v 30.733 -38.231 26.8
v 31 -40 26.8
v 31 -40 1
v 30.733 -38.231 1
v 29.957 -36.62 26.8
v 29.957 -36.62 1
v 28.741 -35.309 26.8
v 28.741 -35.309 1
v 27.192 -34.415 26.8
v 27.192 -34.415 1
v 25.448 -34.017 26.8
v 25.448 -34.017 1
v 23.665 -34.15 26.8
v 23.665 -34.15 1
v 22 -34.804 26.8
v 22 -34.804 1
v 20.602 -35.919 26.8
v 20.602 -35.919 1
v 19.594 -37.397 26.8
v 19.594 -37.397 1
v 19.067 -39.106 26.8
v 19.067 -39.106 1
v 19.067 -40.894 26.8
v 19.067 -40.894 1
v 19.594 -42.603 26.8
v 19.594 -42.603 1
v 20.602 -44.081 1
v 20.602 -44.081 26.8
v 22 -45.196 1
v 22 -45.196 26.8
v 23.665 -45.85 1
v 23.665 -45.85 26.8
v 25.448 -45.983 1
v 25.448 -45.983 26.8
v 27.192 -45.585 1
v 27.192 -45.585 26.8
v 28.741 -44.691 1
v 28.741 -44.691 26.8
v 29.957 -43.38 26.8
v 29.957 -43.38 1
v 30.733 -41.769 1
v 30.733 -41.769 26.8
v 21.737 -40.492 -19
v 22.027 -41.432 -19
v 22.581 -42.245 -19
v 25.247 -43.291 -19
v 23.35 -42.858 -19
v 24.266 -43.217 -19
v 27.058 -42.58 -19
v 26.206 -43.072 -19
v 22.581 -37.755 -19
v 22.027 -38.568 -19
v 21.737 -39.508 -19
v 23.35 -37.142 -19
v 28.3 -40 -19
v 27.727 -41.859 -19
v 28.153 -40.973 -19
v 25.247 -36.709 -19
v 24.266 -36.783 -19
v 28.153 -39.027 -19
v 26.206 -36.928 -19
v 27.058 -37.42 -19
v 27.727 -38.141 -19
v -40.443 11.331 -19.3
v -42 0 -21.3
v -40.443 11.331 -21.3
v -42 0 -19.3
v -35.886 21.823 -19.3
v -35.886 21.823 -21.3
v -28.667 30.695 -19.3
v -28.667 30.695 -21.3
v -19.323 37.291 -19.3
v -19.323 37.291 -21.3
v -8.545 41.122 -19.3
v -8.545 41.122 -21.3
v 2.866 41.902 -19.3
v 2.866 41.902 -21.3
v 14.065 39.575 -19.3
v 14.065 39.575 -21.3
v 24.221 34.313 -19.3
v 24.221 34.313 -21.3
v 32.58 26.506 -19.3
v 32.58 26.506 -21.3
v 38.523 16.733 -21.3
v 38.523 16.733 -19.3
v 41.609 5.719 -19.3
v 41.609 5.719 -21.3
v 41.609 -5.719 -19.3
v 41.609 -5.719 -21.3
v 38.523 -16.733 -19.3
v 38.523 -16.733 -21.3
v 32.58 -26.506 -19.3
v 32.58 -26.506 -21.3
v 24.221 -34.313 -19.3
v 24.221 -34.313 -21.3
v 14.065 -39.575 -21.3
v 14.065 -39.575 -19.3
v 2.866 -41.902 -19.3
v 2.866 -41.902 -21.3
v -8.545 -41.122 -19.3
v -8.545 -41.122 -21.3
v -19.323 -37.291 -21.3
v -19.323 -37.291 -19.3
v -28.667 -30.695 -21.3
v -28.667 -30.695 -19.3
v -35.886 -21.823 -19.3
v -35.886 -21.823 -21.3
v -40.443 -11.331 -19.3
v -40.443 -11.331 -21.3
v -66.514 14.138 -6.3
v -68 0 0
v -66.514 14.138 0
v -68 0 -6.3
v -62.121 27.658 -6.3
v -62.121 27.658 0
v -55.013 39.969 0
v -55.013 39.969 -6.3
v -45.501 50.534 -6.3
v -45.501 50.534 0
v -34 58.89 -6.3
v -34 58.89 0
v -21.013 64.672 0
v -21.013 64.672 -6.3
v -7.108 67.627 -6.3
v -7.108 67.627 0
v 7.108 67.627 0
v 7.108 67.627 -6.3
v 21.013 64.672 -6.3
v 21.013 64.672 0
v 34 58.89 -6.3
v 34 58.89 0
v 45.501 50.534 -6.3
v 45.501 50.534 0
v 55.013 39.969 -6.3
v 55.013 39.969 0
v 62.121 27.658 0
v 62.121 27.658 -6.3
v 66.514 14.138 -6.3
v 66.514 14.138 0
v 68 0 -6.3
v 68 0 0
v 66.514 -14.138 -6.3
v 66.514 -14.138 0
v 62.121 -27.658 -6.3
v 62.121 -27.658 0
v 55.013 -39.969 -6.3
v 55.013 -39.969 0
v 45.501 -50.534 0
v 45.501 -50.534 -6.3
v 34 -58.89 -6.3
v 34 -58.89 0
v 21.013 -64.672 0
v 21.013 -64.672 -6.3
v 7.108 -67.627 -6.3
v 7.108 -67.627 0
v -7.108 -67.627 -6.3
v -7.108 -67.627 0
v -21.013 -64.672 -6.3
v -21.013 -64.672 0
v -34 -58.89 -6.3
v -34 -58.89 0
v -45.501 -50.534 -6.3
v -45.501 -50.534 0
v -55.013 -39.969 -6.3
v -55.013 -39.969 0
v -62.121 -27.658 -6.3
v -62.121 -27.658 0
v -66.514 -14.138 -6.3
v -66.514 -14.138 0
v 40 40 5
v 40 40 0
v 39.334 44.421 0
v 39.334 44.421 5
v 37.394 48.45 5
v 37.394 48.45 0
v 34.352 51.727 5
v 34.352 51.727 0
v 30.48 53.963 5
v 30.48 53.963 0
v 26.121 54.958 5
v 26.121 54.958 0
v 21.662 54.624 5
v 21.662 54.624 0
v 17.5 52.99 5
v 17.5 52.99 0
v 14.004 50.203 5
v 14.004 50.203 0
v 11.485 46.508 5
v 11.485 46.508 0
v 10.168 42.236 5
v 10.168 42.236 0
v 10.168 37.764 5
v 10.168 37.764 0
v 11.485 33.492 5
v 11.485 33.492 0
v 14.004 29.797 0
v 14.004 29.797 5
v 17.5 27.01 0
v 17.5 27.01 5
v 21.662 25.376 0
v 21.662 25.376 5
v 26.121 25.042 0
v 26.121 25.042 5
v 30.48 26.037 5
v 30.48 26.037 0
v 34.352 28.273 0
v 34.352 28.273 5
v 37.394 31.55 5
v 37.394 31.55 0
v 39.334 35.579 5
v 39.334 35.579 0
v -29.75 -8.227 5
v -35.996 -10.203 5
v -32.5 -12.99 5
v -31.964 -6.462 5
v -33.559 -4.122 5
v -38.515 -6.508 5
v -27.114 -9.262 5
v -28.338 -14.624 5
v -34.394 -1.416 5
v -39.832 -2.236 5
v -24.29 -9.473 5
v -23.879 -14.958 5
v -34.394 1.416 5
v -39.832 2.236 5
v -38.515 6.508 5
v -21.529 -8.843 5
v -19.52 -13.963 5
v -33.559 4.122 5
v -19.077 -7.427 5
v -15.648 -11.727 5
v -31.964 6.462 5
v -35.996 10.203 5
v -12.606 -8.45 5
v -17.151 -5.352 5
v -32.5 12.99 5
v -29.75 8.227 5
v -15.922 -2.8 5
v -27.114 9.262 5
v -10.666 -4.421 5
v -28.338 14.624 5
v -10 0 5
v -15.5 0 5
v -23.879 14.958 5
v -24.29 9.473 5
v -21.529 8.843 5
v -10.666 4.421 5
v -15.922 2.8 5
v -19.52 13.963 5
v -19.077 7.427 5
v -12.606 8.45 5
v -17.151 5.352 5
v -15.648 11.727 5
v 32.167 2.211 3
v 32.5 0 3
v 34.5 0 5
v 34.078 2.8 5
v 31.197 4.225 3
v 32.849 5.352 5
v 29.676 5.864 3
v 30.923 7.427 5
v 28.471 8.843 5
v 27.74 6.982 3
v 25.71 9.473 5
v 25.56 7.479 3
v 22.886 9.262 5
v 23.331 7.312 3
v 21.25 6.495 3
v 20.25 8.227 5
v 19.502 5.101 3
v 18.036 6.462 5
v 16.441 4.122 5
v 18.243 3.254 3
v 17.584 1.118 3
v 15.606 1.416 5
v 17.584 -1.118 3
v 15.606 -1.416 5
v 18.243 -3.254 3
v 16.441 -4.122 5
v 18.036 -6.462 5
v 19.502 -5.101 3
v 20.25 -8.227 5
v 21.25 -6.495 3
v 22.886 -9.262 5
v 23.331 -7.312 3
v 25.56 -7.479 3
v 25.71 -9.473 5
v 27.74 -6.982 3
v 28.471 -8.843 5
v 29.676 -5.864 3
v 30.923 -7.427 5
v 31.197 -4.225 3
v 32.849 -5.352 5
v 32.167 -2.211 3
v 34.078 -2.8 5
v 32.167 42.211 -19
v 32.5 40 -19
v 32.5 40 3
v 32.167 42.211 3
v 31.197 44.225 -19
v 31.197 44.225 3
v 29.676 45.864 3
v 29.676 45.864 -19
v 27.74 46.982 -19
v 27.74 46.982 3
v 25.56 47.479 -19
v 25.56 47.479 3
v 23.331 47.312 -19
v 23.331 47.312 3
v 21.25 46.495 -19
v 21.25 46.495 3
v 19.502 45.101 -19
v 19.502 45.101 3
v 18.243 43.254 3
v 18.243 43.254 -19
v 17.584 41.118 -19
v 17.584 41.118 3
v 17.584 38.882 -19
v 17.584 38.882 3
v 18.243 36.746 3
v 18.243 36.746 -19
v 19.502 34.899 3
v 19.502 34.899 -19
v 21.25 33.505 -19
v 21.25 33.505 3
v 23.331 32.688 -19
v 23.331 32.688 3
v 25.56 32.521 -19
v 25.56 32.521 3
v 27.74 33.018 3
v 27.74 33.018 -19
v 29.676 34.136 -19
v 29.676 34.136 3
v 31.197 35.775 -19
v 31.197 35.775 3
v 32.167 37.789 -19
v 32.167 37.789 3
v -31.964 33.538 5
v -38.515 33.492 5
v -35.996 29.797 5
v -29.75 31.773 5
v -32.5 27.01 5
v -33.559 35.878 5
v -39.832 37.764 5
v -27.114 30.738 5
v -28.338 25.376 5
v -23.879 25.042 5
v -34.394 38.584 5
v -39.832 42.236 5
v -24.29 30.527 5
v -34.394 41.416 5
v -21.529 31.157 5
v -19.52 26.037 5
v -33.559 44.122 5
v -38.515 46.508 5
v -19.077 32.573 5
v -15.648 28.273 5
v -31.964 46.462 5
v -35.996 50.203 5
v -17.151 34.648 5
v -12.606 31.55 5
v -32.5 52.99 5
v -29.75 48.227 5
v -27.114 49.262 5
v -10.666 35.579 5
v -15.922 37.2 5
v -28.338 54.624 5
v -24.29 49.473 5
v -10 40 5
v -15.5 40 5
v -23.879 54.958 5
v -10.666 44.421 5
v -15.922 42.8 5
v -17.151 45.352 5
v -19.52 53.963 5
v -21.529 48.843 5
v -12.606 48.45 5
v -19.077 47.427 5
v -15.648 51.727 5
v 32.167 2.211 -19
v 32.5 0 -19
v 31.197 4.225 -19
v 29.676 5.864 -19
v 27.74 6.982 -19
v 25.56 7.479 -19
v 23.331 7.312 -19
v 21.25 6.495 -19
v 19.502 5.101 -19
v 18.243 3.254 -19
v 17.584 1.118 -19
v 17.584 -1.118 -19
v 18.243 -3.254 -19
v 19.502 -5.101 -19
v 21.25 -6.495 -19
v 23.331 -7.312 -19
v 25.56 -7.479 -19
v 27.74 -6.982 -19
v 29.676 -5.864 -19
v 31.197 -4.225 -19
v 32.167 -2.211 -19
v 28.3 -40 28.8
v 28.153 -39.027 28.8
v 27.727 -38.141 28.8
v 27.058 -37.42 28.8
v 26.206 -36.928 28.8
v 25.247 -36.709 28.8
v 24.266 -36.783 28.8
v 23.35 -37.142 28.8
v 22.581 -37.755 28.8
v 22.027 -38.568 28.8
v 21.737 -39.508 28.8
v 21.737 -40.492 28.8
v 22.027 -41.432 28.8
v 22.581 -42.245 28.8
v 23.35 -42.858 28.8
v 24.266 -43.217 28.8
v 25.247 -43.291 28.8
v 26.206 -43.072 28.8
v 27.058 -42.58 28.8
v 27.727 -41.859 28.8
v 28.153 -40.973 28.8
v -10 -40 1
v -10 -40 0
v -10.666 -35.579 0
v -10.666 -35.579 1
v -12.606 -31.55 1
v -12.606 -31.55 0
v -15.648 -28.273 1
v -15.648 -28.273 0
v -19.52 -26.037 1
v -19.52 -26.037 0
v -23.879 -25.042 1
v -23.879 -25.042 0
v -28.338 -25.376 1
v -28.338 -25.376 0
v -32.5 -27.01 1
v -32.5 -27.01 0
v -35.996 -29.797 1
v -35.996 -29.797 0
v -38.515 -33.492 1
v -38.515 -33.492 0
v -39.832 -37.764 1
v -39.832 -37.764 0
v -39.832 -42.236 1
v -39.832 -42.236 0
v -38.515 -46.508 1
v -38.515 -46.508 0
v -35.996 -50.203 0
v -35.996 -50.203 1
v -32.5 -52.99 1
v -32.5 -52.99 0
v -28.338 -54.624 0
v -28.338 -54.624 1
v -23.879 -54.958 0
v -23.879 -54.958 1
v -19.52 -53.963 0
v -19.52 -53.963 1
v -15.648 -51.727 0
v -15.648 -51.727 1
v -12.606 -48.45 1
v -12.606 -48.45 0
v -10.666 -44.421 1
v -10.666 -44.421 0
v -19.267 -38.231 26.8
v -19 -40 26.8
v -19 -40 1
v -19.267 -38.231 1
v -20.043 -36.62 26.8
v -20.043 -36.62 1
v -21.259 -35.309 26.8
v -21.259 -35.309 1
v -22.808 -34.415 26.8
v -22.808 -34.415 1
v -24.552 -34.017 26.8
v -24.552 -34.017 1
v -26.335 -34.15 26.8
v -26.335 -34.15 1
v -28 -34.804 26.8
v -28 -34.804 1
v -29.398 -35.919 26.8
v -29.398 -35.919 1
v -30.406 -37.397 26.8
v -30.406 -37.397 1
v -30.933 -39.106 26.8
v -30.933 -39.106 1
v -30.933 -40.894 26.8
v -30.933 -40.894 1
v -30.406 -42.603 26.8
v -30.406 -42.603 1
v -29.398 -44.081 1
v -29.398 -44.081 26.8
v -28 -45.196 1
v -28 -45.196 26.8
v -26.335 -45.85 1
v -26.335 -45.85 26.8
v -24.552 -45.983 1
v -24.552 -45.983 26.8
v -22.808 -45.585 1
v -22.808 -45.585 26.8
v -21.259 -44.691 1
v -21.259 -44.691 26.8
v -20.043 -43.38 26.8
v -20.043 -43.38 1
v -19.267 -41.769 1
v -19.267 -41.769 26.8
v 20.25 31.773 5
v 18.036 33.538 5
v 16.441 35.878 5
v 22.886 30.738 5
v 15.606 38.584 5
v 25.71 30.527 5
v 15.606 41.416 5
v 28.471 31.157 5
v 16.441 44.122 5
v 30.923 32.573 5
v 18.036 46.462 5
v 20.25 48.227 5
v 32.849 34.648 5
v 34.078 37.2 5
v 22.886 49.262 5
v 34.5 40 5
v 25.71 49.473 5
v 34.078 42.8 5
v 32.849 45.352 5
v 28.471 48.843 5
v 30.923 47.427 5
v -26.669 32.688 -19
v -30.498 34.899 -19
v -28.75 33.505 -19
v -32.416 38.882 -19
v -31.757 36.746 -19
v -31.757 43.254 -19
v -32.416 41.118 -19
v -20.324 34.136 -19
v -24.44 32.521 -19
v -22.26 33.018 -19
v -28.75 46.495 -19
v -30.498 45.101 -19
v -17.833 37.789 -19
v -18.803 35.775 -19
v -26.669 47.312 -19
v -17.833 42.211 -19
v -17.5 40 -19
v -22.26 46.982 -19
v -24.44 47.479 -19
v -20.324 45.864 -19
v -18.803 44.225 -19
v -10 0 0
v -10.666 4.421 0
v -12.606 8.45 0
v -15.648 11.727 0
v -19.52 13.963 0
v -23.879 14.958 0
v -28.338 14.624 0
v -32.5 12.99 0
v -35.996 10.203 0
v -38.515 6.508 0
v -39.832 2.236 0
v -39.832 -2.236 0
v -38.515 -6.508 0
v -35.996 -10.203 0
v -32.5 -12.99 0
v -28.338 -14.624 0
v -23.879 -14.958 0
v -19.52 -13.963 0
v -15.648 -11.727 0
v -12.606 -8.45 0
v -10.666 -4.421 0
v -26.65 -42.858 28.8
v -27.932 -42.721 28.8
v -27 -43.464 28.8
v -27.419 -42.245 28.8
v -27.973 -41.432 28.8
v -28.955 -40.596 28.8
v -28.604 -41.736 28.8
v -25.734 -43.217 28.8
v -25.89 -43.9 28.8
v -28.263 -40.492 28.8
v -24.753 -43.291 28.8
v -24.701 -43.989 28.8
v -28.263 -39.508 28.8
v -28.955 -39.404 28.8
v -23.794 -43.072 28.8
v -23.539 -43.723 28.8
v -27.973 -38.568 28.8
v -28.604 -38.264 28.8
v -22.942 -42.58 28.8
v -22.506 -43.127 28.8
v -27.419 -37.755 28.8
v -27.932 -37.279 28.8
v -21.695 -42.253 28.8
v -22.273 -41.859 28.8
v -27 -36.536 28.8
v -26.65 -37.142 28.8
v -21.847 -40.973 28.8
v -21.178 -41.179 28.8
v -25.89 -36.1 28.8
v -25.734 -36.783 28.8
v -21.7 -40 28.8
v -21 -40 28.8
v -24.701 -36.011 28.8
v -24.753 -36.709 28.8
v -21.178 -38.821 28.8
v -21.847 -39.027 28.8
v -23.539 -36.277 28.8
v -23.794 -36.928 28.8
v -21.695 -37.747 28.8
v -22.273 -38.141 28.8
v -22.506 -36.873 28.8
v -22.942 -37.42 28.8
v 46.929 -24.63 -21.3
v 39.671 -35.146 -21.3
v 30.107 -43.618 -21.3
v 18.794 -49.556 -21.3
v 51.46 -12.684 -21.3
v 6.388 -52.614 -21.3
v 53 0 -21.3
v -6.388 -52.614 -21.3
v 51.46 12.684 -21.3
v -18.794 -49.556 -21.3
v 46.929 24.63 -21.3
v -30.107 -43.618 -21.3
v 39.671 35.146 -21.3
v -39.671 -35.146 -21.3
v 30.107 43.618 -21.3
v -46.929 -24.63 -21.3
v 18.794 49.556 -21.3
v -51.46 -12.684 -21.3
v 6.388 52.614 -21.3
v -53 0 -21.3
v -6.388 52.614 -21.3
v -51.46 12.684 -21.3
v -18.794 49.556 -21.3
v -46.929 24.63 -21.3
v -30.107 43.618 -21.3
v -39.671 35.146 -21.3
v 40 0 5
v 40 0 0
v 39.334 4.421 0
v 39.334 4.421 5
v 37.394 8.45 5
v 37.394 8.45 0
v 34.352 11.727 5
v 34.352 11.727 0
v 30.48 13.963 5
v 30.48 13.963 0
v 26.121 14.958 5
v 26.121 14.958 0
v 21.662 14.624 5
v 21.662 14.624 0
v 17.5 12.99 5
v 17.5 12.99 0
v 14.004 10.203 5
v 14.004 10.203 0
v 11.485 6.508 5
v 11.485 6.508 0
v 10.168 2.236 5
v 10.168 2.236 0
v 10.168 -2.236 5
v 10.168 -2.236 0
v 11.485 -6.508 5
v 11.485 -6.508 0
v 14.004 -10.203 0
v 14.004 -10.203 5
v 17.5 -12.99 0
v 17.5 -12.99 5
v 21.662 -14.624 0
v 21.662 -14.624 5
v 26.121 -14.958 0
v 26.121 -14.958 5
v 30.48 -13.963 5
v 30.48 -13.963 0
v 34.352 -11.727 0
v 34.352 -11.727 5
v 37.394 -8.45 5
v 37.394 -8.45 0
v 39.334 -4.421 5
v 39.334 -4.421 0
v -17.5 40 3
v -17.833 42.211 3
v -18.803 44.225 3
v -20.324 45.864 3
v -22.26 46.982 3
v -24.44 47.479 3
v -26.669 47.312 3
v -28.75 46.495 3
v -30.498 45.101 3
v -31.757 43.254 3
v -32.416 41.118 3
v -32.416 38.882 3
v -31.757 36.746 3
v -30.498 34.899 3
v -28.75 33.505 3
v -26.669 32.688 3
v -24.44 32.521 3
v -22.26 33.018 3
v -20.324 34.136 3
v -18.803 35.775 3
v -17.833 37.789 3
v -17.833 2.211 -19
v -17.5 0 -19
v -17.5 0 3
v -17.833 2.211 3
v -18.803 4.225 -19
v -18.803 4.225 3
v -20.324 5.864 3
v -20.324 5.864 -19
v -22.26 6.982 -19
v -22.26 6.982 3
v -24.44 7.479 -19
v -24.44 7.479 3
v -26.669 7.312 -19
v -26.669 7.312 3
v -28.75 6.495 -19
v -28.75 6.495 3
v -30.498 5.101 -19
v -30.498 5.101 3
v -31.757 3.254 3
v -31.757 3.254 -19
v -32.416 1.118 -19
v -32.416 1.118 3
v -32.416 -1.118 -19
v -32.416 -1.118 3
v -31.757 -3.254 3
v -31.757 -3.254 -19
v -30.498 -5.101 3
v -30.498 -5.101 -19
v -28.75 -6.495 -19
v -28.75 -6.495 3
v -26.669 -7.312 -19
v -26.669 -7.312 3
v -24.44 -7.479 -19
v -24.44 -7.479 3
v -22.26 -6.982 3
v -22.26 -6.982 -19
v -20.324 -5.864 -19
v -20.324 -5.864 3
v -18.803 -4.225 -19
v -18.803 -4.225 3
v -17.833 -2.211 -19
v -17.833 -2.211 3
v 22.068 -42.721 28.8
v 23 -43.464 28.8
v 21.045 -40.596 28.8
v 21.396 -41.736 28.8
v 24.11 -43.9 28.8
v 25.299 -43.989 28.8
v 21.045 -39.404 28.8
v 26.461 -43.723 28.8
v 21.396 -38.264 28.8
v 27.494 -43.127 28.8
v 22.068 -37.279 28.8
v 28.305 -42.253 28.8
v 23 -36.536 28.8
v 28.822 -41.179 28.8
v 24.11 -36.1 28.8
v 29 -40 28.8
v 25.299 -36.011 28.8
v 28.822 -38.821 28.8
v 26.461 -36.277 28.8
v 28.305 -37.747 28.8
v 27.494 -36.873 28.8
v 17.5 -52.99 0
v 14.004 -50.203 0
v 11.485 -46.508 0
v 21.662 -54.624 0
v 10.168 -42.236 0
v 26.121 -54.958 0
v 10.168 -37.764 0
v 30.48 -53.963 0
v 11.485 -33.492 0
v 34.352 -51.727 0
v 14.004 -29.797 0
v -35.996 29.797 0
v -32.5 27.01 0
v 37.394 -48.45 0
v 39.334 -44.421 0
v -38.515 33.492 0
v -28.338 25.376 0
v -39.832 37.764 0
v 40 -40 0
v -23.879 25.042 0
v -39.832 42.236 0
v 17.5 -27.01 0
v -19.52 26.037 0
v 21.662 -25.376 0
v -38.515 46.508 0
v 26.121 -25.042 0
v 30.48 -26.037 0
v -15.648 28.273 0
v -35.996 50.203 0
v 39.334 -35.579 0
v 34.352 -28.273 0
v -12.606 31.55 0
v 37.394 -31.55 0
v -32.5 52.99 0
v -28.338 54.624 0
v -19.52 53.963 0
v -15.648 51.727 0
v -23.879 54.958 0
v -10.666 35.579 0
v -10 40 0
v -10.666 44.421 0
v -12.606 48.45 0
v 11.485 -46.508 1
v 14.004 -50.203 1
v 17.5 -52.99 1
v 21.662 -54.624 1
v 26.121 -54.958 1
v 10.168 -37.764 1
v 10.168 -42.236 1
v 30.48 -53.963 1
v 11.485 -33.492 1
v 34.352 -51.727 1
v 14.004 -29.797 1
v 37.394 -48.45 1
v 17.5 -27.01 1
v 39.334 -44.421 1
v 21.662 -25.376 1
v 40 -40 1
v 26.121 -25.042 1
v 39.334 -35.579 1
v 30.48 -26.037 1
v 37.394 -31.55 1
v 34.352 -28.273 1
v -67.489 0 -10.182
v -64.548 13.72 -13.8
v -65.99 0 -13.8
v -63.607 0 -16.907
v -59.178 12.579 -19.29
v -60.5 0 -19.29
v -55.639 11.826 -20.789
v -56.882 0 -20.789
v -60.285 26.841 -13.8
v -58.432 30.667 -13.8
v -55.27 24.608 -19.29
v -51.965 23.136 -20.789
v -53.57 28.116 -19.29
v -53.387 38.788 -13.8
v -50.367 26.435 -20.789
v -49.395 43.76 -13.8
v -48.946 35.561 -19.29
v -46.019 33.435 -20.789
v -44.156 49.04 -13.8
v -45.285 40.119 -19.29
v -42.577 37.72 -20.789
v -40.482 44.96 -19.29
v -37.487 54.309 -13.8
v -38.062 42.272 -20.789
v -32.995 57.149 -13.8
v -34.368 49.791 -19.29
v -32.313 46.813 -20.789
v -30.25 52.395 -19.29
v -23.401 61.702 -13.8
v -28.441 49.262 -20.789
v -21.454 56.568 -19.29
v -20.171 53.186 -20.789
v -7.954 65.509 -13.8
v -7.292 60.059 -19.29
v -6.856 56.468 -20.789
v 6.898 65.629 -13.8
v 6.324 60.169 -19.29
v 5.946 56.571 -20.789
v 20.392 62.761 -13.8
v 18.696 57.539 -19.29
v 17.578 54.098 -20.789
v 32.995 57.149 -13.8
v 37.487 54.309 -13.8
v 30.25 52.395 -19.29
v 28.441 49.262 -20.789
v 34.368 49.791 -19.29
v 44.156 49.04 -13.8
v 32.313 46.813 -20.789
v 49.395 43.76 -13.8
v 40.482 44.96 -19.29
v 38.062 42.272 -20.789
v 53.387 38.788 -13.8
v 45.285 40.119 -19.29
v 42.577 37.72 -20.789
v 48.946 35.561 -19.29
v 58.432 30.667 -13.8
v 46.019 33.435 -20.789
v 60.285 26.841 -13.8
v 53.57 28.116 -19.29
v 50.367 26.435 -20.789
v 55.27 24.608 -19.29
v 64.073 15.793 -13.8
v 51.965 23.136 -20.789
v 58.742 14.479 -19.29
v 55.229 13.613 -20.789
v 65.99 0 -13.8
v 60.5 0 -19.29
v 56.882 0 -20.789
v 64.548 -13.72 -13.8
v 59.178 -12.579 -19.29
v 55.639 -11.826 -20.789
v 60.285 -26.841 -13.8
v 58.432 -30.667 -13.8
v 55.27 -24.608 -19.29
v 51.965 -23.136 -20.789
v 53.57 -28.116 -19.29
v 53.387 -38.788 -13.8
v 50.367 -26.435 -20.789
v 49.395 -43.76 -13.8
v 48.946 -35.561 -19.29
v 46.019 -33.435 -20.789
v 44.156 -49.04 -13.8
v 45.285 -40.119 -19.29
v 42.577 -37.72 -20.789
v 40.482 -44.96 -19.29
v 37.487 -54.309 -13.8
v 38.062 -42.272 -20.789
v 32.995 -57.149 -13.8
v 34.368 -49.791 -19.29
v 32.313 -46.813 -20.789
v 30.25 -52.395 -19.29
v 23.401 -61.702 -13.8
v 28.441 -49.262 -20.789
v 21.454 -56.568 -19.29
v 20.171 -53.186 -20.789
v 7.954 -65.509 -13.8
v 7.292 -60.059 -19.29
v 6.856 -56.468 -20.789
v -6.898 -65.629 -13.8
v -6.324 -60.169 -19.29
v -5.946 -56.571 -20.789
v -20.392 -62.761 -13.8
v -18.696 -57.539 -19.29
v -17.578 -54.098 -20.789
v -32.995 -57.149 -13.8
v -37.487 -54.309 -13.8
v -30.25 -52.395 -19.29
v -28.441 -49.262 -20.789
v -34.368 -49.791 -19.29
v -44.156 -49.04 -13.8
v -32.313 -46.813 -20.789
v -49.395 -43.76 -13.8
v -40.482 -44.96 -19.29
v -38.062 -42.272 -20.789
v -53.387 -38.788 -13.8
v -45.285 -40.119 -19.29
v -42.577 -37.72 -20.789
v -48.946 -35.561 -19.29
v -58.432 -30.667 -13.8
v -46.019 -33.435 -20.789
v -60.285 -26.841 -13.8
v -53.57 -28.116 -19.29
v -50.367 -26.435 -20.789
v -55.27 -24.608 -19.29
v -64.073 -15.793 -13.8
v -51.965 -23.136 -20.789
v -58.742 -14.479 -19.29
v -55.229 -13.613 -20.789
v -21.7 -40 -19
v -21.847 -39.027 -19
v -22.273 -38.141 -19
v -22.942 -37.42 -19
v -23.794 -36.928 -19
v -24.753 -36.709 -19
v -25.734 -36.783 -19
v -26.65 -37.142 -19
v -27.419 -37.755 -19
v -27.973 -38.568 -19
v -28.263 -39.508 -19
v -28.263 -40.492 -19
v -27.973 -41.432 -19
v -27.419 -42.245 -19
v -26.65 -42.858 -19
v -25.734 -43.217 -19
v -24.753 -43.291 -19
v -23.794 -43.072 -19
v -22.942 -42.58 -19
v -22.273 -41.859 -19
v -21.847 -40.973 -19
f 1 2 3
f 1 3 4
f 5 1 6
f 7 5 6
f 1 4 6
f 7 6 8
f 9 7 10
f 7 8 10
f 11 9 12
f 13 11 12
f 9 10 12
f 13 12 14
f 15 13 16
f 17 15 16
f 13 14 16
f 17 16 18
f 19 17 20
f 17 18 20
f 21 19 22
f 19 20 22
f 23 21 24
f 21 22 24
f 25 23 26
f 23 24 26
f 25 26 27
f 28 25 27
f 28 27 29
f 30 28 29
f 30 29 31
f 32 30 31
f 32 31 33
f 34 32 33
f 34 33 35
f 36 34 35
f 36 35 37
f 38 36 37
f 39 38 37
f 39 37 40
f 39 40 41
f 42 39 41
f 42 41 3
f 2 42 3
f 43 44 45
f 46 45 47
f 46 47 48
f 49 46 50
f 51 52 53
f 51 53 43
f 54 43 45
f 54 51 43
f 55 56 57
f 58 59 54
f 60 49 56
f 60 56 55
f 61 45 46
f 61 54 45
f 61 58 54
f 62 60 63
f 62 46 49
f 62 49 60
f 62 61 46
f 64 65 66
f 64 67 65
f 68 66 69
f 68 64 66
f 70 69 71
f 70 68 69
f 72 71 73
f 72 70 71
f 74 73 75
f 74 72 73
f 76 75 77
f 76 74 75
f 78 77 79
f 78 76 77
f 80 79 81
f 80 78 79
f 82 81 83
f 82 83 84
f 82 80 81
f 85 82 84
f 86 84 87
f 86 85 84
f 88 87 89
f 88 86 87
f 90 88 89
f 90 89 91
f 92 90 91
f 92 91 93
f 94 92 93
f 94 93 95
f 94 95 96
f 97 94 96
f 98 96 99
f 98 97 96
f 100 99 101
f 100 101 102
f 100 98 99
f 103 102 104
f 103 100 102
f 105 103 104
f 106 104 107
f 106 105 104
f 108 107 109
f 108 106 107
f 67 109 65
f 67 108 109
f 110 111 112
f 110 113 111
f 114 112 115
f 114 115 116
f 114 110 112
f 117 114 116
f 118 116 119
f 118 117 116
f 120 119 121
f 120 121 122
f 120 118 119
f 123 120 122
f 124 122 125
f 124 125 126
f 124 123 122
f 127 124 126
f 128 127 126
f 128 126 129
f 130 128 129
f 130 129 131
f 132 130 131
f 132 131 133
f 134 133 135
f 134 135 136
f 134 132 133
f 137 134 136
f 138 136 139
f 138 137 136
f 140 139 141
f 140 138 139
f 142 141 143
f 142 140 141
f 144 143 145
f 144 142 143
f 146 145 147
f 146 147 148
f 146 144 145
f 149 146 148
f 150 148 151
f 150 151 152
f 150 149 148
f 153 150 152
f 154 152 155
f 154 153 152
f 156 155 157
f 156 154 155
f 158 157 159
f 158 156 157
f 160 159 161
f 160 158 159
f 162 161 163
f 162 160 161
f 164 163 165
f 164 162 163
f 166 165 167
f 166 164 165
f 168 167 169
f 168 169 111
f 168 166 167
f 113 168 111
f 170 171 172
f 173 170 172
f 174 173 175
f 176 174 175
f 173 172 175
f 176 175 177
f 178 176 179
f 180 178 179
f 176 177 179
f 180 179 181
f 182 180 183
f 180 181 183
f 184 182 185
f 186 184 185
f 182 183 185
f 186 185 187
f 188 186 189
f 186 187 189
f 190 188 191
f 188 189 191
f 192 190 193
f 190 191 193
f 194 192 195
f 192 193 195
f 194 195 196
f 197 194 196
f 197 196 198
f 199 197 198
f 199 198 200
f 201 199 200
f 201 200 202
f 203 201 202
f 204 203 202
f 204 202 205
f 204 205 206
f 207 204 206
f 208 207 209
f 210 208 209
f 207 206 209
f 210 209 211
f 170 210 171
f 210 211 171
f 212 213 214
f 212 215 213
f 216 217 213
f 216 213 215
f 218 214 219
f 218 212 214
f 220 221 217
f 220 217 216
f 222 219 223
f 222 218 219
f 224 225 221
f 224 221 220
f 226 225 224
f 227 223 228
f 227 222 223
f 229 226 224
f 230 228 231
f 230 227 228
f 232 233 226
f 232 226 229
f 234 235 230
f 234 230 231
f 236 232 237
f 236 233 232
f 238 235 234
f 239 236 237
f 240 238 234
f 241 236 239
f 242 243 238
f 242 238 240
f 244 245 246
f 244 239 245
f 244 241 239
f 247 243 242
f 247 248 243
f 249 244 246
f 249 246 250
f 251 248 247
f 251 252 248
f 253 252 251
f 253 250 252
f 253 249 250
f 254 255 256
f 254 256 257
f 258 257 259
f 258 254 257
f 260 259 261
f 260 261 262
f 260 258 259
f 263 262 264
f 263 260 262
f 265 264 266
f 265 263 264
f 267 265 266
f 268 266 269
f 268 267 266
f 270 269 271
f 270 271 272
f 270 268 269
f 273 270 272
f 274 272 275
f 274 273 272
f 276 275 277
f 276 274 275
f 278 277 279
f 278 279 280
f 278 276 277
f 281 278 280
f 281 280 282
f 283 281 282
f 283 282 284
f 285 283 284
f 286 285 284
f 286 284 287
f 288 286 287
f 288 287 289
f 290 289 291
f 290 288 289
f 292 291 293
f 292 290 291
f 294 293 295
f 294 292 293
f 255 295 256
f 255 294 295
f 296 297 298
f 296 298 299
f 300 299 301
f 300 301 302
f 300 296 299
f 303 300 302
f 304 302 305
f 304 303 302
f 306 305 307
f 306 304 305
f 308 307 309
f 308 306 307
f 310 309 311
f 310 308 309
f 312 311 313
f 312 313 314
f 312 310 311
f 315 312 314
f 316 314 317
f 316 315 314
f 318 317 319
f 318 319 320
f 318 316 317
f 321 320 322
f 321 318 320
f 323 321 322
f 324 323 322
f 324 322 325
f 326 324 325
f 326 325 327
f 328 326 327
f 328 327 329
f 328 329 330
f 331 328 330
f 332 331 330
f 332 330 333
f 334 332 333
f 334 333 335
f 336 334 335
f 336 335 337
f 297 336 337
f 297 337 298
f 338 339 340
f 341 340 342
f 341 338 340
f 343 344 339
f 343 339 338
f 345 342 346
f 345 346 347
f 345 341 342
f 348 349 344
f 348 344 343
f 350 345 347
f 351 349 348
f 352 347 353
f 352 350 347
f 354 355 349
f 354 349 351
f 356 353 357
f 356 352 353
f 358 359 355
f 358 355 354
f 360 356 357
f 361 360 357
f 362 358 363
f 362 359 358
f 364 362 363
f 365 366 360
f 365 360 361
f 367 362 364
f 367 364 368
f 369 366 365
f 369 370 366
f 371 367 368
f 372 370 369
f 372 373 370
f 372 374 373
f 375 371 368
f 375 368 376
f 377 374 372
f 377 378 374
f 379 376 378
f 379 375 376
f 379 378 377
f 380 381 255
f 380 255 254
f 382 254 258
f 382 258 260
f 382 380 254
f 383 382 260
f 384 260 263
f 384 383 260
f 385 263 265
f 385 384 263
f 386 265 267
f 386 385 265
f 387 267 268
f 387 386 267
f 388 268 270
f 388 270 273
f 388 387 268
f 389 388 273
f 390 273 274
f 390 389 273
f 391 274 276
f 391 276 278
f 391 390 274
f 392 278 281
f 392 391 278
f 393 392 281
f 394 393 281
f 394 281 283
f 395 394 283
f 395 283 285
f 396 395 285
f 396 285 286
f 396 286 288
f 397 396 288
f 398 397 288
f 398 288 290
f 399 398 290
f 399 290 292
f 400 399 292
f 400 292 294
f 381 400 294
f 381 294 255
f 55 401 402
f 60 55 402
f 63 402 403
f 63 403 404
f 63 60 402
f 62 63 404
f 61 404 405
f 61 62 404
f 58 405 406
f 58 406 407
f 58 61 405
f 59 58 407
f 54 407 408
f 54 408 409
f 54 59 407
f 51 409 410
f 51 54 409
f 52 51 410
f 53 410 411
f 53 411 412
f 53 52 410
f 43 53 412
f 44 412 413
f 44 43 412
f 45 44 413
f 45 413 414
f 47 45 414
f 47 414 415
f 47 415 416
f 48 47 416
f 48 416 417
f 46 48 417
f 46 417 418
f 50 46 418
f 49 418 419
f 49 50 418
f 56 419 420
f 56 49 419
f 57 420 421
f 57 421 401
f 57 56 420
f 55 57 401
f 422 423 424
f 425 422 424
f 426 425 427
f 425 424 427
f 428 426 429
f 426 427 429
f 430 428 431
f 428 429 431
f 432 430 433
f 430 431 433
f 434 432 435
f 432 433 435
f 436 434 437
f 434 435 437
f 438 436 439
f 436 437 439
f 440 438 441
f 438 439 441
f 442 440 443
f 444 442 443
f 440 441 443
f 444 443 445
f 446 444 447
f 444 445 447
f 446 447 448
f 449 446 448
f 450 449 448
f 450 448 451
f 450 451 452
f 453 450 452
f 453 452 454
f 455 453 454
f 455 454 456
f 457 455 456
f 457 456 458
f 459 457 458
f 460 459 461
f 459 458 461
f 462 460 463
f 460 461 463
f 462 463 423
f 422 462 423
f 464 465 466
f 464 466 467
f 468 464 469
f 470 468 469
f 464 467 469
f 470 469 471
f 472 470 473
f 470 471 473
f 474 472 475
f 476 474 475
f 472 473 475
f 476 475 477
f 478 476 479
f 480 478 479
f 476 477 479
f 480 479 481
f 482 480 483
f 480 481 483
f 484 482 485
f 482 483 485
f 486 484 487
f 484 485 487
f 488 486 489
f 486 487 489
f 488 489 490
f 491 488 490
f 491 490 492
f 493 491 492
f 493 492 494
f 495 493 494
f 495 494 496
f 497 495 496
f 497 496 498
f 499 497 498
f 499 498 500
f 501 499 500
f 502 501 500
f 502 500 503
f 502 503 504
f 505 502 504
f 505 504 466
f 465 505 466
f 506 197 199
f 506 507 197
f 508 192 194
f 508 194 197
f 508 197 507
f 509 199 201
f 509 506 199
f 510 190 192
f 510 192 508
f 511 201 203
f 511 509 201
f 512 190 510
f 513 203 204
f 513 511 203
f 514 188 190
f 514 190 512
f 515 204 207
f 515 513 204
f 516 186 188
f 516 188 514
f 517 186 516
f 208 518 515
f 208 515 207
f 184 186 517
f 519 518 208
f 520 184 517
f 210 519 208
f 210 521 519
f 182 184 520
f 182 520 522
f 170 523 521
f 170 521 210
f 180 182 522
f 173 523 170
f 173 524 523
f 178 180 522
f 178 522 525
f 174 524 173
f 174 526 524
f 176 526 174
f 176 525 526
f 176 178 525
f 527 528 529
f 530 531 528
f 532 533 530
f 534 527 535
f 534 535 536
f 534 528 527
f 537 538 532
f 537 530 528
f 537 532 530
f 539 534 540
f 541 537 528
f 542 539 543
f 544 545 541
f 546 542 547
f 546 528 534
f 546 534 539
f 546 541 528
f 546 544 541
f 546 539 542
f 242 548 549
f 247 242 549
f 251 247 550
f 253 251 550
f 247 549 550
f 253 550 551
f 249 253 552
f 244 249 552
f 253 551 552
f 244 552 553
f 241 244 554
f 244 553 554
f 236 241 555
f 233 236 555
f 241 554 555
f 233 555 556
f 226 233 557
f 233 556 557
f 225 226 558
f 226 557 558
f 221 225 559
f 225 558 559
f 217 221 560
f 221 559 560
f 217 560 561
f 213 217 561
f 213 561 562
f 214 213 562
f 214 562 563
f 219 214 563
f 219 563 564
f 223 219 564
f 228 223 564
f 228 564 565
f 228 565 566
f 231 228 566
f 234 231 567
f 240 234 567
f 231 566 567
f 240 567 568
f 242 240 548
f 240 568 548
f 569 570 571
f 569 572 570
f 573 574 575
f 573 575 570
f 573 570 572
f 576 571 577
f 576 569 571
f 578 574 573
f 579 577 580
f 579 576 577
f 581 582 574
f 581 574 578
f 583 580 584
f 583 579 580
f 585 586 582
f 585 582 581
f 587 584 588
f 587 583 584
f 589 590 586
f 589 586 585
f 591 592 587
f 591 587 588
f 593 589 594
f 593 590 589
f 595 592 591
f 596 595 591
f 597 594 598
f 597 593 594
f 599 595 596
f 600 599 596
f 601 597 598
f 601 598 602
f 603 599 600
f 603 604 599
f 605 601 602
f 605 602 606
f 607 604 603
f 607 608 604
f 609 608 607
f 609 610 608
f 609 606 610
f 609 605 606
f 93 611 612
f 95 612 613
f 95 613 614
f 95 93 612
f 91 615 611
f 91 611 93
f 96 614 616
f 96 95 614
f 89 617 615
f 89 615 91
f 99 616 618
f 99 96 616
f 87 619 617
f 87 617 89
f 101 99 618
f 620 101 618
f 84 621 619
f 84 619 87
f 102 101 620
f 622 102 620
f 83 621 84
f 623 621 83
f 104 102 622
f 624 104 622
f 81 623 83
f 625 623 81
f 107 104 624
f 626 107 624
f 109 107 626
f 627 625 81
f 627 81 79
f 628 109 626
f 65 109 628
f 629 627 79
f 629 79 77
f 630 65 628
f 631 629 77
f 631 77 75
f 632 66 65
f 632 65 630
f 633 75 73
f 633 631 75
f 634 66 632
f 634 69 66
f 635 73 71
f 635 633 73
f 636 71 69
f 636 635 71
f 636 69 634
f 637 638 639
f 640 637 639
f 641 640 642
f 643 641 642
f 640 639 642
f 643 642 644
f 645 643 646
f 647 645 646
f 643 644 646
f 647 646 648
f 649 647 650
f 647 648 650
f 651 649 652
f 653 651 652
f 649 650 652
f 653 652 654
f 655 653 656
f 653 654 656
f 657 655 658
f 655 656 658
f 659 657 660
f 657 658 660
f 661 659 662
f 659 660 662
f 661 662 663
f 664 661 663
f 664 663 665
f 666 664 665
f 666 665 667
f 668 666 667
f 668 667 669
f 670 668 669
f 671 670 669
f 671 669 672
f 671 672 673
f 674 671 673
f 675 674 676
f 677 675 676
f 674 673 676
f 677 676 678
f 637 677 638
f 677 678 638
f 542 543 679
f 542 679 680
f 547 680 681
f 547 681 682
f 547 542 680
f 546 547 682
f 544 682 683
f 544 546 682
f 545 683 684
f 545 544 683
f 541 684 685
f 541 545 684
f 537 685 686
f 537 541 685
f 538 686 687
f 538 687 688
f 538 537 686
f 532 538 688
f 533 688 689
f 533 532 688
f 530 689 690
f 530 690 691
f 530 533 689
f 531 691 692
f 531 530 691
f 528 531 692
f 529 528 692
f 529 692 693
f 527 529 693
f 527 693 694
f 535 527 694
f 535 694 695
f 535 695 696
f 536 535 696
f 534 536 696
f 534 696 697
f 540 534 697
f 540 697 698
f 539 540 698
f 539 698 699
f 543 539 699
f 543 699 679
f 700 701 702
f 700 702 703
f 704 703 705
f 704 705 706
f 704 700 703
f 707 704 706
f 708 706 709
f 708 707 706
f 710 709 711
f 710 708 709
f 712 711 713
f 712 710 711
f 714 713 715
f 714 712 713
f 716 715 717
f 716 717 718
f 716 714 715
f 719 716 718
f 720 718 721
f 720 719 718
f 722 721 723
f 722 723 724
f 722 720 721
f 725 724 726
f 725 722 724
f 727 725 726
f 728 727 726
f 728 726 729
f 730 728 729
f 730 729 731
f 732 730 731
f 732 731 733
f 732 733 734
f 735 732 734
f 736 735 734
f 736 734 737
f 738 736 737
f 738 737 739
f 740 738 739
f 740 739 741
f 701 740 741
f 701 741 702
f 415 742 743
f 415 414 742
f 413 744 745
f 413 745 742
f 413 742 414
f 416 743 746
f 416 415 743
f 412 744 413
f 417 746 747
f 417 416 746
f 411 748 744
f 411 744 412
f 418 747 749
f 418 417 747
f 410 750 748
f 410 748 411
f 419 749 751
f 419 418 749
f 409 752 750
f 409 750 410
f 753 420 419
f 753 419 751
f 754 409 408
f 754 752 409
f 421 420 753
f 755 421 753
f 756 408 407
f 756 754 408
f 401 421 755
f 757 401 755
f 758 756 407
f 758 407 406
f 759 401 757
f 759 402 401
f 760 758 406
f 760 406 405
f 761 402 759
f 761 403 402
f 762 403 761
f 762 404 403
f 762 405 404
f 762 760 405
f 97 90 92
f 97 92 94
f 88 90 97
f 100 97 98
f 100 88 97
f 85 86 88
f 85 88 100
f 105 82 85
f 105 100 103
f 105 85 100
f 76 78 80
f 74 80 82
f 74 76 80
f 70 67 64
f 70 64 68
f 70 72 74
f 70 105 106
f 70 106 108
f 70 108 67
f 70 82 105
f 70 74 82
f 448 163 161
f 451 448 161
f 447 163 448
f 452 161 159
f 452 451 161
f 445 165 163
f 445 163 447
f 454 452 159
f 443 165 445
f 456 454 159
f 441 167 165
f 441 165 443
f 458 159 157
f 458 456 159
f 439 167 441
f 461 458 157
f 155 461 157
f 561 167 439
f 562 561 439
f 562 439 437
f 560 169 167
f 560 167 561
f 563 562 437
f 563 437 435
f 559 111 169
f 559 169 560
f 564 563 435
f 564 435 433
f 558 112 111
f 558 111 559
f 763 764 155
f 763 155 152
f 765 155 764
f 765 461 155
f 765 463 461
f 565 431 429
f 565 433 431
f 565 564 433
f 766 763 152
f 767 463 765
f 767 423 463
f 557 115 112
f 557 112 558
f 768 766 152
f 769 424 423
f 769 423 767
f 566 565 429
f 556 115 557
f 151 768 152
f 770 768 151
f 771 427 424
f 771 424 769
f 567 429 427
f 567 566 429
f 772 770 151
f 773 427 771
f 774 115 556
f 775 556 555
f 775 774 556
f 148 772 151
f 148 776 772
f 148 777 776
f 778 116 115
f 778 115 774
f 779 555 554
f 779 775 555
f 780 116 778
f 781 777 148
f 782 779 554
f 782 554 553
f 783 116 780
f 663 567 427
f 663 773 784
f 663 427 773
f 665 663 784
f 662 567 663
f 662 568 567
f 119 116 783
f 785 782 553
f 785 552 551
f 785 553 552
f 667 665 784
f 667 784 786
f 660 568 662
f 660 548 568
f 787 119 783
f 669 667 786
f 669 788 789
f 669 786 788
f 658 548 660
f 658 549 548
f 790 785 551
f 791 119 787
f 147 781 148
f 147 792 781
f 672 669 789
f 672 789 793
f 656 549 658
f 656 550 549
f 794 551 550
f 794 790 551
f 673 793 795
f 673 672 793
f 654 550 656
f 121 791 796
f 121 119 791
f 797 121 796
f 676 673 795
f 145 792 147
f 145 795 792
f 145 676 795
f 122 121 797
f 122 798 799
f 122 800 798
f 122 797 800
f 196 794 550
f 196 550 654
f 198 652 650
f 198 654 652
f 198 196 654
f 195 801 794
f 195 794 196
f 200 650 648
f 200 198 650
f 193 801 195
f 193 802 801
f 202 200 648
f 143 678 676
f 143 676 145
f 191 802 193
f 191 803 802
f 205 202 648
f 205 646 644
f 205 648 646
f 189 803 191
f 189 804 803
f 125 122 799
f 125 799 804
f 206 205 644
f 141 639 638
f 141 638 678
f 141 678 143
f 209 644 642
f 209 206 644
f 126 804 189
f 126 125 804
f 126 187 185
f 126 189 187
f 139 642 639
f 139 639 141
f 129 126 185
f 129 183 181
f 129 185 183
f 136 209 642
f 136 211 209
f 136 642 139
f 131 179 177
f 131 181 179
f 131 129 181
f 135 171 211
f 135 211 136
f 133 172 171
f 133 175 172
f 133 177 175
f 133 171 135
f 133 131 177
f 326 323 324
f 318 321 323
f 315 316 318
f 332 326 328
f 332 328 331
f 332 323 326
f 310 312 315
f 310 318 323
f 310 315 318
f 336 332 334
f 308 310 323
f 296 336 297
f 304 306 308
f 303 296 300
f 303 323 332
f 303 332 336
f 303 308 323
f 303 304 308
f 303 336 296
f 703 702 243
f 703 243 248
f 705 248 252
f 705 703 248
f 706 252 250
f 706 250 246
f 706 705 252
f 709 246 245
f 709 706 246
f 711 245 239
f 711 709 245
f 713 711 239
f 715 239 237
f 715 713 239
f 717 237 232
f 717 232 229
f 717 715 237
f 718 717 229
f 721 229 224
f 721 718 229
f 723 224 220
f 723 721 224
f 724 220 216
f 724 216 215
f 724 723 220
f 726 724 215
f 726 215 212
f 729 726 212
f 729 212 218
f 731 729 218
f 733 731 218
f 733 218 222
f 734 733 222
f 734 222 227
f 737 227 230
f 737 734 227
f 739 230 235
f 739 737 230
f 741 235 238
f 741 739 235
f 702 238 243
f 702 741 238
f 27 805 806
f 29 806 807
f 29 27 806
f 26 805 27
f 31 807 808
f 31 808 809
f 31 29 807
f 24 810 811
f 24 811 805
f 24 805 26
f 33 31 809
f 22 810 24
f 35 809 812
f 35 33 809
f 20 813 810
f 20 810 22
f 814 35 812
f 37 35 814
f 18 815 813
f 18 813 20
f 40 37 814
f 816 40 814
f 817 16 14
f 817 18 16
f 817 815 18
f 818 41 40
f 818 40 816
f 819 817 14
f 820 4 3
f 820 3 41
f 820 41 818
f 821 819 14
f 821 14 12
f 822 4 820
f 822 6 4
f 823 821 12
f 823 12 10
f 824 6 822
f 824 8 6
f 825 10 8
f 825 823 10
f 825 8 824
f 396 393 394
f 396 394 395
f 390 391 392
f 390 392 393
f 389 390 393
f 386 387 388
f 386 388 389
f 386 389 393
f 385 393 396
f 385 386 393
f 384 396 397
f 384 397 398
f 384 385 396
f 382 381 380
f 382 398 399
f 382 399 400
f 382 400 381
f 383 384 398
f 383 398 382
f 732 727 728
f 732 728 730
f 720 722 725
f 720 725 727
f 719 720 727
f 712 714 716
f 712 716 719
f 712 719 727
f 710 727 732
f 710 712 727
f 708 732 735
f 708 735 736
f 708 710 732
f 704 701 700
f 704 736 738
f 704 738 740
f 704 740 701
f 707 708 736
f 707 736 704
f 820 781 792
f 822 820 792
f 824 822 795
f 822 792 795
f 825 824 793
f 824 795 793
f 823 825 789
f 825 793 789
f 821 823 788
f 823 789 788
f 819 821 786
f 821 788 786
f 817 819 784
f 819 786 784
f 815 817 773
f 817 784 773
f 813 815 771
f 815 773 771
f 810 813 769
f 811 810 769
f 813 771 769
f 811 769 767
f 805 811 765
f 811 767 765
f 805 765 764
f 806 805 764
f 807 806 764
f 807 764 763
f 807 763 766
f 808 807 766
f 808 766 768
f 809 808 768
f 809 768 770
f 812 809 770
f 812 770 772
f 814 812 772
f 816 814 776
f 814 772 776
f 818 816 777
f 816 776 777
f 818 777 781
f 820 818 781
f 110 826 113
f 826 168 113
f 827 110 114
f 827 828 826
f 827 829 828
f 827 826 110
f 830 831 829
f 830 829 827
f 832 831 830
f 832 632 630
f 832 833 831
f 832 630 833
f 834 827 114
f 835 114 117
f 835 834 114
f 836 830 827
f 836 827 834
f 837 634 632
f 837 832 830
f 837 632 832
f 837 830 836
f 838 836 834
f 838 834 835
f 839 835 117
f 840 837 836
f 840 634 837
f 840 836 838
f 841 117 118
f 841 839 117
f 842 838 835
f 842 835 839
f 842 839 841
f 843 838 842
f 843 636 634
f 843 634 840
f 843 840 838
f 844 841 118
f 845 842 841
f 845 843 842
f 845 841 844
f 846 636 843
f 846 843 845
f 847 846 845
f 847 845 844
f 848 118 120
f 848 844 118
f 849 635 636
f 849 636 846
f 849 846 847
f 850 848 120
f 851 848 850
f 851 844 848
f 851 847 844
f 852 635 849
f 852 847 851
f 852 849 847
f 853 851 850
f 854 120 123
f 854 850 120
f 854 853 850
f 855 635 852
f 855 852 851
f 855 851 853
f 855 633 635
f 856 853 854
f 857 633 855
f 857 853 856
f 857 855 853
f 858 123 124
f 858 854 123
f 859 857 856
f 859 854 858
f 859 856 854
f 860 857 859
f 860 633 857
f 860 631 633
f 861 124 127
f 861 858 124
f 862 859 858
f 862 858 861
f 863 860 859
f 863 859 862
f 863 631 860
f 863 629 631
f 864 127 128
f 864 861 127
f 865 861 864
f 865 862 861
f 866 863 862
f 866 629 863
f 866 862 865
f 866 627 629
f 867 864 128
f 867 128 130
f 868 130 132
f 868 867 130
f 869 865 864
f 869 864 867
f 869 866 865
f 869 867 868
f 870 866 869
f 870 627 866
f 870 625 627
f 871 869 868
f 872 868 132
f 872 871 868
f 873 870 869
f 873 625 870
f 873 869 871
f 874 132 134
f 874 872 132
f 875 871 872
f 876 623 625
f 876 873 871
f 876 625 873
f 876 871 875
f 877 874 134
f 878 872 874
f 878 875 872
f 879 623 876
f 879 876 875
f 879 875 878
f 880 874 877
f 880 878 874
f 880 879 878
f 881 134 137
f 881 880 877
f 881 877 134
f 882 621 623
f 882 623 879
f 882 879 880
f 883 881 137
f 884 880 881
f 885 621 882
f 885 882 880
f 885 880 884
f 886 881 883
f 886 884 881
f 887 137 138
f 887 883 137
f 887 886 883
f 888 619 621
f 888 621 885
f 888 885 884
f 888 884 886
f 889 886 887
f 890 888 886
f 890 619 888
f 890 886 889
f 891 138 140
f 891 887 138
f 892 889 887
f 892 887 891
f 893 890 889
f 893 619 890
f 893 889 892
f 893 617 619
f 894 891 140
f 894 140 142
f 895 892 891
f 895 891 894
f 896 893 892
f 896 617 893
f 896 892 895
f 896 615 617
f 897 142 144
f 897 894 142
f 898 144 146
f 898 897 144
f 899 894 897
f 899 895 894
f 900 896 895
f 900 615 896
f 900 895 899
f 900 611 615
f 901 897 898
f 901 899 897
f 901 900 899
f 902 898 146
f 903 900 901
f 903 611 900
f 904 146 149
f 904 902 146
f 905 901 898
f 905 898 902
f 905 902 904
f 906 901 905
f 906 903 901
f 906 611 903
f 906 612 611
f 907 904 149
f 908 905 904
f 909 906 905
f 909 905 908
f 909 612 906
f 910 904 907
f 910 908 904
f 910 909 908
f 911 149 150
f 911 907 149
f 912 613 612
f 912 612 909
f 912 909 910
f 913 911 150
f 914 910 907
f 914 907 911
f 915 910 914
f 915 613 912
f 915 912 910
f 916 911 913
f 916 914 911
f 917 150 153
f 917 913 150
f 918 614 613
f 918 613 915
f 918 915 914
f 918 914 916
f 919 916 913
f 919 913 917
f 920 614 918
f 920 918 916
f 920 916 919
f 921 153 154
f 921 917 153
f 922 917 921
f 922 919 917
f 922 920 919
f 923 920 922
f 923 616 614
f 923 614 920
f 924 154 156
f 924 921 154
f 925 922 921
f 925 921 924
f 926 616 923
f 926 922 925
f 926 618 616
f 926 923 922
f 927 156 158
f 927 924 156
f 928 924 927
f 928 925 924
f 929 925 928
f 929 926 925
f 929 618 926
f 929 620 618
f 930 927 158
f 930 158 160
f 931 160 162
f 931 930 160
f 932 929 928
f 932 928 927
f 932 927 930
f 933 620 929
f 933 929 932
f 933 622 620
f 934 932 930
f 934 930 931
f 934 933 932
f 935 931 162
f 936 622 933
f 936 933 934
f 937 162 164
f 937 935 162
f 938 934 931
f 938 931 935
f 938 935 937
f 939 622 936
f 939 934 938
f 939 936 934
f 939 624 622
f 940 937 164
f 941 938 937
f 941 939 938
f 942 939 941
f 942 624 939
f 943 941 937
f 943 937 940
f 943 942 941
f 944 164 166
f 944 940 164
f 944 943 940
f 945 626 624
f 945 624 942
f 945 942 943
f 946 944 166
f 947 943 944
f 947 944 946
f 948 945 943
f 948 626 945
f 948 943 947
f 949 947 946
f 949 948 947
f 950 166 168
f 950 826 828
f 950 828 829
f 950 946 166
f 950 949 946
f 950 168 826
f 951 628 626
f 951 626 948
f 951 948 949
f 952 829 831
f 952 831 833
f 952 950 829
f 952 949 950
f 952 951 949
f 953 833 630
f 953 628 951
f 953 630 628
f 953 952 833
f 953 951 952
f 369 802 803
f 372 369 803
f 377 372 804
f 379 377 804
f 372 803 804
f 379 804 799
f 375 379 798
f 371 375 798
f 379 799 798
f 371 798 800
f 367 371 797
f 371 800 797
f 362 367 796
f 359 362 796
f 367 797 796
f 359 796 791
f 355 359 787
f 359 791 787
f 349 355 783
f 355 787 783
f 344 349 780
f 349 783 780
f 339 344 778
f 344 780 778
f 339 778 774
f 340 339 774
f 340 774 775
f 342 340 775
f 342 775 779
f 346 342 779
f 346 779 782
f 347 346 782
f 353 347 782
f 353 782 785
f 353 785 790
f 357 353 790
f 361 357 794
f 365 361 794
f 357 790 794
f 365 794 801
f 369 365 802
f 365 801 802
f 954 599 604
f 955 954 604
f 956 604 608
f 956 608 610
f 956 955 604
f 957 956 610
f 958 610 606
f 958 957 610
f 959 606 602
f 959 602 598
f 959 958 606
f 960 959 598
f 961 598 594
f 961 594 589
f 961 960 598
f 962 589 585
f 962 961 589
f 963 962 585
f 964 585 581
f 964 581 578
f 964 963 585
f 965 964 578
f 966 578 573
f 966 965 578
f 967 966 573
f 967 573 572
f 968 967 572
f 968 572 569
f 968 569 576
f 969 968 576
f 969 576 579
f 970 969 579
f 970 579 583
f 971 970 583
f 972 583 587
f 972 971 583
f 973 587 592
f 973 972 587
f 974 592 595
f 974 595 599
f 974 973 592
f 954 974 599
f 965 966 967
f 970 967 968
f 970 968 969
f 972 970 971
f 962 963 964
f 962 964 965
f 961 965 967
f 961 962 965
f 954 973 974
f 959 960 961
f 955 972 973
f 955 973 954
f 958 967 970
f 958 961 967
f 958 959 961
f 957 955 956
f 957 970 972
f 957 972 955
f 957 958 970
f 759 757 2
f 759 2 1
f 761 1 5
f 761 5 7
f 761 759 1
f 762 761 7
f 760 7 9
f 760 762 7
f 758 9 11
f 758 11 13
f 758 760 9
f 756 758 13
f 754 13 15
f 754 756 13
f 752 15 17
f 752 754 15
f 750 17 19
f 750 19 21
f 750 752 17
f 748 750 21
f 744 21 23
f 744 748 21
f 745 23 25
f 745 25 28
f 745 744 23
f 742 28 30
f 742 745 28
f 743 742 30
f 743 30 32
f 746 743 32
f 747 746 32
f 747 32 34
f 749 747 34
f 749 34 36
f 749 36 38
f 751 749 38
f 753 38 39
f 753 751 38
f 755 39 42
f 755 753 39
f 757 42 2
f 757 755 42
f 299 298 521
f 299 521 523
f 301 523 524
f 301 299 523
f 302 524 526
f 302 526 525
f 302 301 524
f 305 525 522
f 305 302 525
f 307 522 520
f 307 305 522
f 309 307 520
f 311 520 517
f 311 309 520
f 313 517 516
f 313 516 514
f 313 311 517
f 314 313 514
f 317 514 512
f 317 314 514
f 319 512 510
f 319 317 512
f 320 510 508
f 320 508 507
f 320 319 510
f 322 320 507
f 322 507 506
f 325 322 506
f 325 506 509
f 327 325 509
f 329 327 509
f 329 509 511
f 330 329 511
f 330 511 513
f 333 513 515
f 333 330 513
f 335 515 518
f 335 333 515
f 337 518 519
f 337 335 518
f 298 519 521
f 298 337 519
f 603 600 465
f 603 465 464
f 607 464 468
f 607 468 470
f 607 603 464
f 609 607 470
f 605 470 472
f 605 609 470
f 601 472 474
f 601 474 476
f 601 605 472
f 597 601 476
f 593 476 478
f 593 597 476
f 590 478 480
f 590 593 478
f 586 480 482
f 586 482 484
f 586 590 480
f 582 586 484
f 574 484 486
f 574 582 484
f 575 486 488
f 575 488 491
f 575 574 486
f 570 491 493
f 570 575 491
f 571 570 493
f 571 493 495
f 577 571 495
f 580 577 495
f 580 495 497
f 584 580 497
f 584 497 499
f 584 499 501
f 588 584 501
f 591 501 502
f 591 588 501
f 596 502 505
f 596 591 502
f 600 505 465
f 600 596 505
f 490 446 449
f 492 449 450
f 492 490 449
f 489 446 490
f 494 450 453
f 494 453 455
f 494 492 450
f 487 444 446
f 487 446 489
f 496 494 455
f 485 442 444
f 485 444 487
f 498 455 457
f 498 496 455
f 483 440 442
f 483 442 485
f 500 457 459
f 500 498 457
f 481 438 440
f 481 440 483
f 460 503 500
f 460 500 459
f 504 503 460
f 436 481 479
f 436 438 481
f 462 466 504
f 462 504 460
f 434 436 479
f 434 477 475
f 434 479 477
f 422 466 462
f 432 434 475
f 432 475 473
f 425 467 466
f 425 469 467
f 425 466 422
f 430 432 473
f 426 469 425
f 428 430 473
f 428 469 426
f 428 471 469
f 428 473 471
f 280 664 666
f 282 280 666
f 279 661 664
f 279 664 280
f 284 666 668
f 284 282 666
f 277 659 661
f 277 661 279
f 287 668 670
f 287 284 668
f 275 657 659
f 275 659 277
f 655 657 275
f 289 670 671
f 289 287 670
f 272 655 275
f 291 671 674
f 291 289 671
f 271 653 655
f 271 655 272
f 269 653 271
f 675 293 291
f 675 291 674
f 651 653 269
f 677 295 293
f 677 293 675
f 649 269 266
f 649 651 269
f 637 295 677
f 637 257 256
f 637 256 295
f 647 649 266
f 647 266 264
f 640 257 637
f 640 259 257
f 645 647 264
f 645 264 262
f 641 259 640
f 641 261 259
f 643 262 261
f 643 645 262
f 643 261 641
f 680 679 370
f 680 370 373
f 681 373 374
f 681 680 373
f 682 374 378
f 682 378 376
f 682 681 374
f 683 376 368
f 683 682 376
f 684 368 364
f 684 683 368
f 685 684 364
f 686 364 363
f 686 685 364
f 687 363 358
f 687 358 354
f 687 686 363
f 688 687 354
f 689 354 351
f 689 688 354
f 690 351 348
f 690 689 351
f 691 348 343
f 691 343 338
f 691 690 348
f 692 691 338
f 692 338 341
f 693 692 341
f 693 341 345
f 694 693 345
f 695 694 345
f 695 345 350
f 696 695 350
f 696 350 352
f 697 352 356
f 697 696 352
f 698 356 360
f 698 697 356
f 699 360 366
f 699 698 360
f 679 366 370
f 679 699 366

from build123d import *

# Parameters (mm, degrees)
F2_R     = 15
F2_R_2   = 7.5
F3_DEPTH = 5
F2_R_3   = 3.3
F4_DEPTH = 19
F2_R_4   = 6
F5_DEPTH = 28.8
F6_DEPTH = 1
F7_SIZE  = 2


with BuildPart() as f1:
    # F0 (on Front) → F1 (revolve)
    with BuildSketch(Plane.XZ):
        with BuildLine():
            Line((0, -19.3), (0, 0))
            Line((0, 0), (-68, 0))
            Line((-68, 0), (-68, -6.3))
            ThreePointArc((-68, -6.3), (-63.606602, -16.906602), (-53, -21.3))
            Line((-53, -21.3), (-42, -21.3))
            Line((-42, -21.3), (-42, -19.3))
            Line((-42, -19.3), (0, -19.3))
        make_face()
    revolve(axis=Axis((0, 0, -9.65), (0, 0, -1)))

    # F2 (on face) → F3 (join)
    with BuildSketch(Plane.XY):
        with Locations((-25, 40)):
            Circle(F2_R)
        with Locations((-25, 40)):
            Circle(F2_R_2, mode=Mode.SUBTRACT)
        with Locations((25, 40)):
            Circle(F2_R)
        with Locations((25, 40)):
            Circle(F2_R_2, mode=Mode.SUBTRACT)
        with Locations((25, 0)):
            Circle(F2_R)
        with Locations((25, 0)):
            Circle(F2_R_2, mode=Mode.SUBTRACT)
        with Locations((-25, 0)):
            Circle(F2_R)
        with Locations((-25, 0)):
            Circle(F2_R_2, mode=Mode.SUBTRACT)
    extrude(amount=F3_DEPTH)

    # F2 (on face) → F4 (cut)
    with BuildSketch(Plane.XY):
        with Locations((-25, 40)):
            Circle(F2_R_2)
        with Locations((25, 40)):
            Circle(F2_R_2)
        with Locations((25, 0)):
            Circle(F2_R_2)
        with Locations((-25, 0)):
            Circle(F2_R_2)
        with Locations((-25, -40)):
            Circle(F2_R_3)
        with Locations((25, -40)):
            Circle(F2_R_3)
    extrude(amount=-F4_DEPTH, mode=Mode.SUBTRACT)

    # F2 (on face) → F5 (join)
    with BuildSketch(Plane.XY):
        with Locations((-25, -40)):
            Circle(F2_R_4)
        with Locations((-25, -40)):
            Circle(F2_R_3, mode=Mode.SUBTRACT)
        with Locations((25, -40)):
            Circle(F2_R_4)
        with Locations((25, -40)):
            Circle(F2_R_3, mode=Mode.SUBTRACT)
    extrude(amount=F5_DEPTH)

    # F2 (on face) → F6 (join)
    with BuildSketch(Plane.XY):
        with Locations((-25, -40)):
            Circle(F2_R)
        with Locations((-25, -40)):
            Circle(F2_R_4, mode=Mode.SUBTRACT)
        with Locations((25, -40)):
            Circle(F2_R)
        with Locations((25, -40)):
            Circle(F2_R_4, mode=Mode.SUBTRACT)
    extrude(amount=F6_DEPTH)

    # F7
    f7_edges = [f1.edges().sort_by_distance(p)[0] for p in [
        (-32.5, 40, 5),
        (17.5, 40, 5),
        (17.5, 0, 5),
        (-32.5, 0, 5),
        (-31, -40, 28.8),
        (19, -40, 28.8),
    ]]
    chamfer(f7_edges, length=F7_SIZE)


solid = f1.part
